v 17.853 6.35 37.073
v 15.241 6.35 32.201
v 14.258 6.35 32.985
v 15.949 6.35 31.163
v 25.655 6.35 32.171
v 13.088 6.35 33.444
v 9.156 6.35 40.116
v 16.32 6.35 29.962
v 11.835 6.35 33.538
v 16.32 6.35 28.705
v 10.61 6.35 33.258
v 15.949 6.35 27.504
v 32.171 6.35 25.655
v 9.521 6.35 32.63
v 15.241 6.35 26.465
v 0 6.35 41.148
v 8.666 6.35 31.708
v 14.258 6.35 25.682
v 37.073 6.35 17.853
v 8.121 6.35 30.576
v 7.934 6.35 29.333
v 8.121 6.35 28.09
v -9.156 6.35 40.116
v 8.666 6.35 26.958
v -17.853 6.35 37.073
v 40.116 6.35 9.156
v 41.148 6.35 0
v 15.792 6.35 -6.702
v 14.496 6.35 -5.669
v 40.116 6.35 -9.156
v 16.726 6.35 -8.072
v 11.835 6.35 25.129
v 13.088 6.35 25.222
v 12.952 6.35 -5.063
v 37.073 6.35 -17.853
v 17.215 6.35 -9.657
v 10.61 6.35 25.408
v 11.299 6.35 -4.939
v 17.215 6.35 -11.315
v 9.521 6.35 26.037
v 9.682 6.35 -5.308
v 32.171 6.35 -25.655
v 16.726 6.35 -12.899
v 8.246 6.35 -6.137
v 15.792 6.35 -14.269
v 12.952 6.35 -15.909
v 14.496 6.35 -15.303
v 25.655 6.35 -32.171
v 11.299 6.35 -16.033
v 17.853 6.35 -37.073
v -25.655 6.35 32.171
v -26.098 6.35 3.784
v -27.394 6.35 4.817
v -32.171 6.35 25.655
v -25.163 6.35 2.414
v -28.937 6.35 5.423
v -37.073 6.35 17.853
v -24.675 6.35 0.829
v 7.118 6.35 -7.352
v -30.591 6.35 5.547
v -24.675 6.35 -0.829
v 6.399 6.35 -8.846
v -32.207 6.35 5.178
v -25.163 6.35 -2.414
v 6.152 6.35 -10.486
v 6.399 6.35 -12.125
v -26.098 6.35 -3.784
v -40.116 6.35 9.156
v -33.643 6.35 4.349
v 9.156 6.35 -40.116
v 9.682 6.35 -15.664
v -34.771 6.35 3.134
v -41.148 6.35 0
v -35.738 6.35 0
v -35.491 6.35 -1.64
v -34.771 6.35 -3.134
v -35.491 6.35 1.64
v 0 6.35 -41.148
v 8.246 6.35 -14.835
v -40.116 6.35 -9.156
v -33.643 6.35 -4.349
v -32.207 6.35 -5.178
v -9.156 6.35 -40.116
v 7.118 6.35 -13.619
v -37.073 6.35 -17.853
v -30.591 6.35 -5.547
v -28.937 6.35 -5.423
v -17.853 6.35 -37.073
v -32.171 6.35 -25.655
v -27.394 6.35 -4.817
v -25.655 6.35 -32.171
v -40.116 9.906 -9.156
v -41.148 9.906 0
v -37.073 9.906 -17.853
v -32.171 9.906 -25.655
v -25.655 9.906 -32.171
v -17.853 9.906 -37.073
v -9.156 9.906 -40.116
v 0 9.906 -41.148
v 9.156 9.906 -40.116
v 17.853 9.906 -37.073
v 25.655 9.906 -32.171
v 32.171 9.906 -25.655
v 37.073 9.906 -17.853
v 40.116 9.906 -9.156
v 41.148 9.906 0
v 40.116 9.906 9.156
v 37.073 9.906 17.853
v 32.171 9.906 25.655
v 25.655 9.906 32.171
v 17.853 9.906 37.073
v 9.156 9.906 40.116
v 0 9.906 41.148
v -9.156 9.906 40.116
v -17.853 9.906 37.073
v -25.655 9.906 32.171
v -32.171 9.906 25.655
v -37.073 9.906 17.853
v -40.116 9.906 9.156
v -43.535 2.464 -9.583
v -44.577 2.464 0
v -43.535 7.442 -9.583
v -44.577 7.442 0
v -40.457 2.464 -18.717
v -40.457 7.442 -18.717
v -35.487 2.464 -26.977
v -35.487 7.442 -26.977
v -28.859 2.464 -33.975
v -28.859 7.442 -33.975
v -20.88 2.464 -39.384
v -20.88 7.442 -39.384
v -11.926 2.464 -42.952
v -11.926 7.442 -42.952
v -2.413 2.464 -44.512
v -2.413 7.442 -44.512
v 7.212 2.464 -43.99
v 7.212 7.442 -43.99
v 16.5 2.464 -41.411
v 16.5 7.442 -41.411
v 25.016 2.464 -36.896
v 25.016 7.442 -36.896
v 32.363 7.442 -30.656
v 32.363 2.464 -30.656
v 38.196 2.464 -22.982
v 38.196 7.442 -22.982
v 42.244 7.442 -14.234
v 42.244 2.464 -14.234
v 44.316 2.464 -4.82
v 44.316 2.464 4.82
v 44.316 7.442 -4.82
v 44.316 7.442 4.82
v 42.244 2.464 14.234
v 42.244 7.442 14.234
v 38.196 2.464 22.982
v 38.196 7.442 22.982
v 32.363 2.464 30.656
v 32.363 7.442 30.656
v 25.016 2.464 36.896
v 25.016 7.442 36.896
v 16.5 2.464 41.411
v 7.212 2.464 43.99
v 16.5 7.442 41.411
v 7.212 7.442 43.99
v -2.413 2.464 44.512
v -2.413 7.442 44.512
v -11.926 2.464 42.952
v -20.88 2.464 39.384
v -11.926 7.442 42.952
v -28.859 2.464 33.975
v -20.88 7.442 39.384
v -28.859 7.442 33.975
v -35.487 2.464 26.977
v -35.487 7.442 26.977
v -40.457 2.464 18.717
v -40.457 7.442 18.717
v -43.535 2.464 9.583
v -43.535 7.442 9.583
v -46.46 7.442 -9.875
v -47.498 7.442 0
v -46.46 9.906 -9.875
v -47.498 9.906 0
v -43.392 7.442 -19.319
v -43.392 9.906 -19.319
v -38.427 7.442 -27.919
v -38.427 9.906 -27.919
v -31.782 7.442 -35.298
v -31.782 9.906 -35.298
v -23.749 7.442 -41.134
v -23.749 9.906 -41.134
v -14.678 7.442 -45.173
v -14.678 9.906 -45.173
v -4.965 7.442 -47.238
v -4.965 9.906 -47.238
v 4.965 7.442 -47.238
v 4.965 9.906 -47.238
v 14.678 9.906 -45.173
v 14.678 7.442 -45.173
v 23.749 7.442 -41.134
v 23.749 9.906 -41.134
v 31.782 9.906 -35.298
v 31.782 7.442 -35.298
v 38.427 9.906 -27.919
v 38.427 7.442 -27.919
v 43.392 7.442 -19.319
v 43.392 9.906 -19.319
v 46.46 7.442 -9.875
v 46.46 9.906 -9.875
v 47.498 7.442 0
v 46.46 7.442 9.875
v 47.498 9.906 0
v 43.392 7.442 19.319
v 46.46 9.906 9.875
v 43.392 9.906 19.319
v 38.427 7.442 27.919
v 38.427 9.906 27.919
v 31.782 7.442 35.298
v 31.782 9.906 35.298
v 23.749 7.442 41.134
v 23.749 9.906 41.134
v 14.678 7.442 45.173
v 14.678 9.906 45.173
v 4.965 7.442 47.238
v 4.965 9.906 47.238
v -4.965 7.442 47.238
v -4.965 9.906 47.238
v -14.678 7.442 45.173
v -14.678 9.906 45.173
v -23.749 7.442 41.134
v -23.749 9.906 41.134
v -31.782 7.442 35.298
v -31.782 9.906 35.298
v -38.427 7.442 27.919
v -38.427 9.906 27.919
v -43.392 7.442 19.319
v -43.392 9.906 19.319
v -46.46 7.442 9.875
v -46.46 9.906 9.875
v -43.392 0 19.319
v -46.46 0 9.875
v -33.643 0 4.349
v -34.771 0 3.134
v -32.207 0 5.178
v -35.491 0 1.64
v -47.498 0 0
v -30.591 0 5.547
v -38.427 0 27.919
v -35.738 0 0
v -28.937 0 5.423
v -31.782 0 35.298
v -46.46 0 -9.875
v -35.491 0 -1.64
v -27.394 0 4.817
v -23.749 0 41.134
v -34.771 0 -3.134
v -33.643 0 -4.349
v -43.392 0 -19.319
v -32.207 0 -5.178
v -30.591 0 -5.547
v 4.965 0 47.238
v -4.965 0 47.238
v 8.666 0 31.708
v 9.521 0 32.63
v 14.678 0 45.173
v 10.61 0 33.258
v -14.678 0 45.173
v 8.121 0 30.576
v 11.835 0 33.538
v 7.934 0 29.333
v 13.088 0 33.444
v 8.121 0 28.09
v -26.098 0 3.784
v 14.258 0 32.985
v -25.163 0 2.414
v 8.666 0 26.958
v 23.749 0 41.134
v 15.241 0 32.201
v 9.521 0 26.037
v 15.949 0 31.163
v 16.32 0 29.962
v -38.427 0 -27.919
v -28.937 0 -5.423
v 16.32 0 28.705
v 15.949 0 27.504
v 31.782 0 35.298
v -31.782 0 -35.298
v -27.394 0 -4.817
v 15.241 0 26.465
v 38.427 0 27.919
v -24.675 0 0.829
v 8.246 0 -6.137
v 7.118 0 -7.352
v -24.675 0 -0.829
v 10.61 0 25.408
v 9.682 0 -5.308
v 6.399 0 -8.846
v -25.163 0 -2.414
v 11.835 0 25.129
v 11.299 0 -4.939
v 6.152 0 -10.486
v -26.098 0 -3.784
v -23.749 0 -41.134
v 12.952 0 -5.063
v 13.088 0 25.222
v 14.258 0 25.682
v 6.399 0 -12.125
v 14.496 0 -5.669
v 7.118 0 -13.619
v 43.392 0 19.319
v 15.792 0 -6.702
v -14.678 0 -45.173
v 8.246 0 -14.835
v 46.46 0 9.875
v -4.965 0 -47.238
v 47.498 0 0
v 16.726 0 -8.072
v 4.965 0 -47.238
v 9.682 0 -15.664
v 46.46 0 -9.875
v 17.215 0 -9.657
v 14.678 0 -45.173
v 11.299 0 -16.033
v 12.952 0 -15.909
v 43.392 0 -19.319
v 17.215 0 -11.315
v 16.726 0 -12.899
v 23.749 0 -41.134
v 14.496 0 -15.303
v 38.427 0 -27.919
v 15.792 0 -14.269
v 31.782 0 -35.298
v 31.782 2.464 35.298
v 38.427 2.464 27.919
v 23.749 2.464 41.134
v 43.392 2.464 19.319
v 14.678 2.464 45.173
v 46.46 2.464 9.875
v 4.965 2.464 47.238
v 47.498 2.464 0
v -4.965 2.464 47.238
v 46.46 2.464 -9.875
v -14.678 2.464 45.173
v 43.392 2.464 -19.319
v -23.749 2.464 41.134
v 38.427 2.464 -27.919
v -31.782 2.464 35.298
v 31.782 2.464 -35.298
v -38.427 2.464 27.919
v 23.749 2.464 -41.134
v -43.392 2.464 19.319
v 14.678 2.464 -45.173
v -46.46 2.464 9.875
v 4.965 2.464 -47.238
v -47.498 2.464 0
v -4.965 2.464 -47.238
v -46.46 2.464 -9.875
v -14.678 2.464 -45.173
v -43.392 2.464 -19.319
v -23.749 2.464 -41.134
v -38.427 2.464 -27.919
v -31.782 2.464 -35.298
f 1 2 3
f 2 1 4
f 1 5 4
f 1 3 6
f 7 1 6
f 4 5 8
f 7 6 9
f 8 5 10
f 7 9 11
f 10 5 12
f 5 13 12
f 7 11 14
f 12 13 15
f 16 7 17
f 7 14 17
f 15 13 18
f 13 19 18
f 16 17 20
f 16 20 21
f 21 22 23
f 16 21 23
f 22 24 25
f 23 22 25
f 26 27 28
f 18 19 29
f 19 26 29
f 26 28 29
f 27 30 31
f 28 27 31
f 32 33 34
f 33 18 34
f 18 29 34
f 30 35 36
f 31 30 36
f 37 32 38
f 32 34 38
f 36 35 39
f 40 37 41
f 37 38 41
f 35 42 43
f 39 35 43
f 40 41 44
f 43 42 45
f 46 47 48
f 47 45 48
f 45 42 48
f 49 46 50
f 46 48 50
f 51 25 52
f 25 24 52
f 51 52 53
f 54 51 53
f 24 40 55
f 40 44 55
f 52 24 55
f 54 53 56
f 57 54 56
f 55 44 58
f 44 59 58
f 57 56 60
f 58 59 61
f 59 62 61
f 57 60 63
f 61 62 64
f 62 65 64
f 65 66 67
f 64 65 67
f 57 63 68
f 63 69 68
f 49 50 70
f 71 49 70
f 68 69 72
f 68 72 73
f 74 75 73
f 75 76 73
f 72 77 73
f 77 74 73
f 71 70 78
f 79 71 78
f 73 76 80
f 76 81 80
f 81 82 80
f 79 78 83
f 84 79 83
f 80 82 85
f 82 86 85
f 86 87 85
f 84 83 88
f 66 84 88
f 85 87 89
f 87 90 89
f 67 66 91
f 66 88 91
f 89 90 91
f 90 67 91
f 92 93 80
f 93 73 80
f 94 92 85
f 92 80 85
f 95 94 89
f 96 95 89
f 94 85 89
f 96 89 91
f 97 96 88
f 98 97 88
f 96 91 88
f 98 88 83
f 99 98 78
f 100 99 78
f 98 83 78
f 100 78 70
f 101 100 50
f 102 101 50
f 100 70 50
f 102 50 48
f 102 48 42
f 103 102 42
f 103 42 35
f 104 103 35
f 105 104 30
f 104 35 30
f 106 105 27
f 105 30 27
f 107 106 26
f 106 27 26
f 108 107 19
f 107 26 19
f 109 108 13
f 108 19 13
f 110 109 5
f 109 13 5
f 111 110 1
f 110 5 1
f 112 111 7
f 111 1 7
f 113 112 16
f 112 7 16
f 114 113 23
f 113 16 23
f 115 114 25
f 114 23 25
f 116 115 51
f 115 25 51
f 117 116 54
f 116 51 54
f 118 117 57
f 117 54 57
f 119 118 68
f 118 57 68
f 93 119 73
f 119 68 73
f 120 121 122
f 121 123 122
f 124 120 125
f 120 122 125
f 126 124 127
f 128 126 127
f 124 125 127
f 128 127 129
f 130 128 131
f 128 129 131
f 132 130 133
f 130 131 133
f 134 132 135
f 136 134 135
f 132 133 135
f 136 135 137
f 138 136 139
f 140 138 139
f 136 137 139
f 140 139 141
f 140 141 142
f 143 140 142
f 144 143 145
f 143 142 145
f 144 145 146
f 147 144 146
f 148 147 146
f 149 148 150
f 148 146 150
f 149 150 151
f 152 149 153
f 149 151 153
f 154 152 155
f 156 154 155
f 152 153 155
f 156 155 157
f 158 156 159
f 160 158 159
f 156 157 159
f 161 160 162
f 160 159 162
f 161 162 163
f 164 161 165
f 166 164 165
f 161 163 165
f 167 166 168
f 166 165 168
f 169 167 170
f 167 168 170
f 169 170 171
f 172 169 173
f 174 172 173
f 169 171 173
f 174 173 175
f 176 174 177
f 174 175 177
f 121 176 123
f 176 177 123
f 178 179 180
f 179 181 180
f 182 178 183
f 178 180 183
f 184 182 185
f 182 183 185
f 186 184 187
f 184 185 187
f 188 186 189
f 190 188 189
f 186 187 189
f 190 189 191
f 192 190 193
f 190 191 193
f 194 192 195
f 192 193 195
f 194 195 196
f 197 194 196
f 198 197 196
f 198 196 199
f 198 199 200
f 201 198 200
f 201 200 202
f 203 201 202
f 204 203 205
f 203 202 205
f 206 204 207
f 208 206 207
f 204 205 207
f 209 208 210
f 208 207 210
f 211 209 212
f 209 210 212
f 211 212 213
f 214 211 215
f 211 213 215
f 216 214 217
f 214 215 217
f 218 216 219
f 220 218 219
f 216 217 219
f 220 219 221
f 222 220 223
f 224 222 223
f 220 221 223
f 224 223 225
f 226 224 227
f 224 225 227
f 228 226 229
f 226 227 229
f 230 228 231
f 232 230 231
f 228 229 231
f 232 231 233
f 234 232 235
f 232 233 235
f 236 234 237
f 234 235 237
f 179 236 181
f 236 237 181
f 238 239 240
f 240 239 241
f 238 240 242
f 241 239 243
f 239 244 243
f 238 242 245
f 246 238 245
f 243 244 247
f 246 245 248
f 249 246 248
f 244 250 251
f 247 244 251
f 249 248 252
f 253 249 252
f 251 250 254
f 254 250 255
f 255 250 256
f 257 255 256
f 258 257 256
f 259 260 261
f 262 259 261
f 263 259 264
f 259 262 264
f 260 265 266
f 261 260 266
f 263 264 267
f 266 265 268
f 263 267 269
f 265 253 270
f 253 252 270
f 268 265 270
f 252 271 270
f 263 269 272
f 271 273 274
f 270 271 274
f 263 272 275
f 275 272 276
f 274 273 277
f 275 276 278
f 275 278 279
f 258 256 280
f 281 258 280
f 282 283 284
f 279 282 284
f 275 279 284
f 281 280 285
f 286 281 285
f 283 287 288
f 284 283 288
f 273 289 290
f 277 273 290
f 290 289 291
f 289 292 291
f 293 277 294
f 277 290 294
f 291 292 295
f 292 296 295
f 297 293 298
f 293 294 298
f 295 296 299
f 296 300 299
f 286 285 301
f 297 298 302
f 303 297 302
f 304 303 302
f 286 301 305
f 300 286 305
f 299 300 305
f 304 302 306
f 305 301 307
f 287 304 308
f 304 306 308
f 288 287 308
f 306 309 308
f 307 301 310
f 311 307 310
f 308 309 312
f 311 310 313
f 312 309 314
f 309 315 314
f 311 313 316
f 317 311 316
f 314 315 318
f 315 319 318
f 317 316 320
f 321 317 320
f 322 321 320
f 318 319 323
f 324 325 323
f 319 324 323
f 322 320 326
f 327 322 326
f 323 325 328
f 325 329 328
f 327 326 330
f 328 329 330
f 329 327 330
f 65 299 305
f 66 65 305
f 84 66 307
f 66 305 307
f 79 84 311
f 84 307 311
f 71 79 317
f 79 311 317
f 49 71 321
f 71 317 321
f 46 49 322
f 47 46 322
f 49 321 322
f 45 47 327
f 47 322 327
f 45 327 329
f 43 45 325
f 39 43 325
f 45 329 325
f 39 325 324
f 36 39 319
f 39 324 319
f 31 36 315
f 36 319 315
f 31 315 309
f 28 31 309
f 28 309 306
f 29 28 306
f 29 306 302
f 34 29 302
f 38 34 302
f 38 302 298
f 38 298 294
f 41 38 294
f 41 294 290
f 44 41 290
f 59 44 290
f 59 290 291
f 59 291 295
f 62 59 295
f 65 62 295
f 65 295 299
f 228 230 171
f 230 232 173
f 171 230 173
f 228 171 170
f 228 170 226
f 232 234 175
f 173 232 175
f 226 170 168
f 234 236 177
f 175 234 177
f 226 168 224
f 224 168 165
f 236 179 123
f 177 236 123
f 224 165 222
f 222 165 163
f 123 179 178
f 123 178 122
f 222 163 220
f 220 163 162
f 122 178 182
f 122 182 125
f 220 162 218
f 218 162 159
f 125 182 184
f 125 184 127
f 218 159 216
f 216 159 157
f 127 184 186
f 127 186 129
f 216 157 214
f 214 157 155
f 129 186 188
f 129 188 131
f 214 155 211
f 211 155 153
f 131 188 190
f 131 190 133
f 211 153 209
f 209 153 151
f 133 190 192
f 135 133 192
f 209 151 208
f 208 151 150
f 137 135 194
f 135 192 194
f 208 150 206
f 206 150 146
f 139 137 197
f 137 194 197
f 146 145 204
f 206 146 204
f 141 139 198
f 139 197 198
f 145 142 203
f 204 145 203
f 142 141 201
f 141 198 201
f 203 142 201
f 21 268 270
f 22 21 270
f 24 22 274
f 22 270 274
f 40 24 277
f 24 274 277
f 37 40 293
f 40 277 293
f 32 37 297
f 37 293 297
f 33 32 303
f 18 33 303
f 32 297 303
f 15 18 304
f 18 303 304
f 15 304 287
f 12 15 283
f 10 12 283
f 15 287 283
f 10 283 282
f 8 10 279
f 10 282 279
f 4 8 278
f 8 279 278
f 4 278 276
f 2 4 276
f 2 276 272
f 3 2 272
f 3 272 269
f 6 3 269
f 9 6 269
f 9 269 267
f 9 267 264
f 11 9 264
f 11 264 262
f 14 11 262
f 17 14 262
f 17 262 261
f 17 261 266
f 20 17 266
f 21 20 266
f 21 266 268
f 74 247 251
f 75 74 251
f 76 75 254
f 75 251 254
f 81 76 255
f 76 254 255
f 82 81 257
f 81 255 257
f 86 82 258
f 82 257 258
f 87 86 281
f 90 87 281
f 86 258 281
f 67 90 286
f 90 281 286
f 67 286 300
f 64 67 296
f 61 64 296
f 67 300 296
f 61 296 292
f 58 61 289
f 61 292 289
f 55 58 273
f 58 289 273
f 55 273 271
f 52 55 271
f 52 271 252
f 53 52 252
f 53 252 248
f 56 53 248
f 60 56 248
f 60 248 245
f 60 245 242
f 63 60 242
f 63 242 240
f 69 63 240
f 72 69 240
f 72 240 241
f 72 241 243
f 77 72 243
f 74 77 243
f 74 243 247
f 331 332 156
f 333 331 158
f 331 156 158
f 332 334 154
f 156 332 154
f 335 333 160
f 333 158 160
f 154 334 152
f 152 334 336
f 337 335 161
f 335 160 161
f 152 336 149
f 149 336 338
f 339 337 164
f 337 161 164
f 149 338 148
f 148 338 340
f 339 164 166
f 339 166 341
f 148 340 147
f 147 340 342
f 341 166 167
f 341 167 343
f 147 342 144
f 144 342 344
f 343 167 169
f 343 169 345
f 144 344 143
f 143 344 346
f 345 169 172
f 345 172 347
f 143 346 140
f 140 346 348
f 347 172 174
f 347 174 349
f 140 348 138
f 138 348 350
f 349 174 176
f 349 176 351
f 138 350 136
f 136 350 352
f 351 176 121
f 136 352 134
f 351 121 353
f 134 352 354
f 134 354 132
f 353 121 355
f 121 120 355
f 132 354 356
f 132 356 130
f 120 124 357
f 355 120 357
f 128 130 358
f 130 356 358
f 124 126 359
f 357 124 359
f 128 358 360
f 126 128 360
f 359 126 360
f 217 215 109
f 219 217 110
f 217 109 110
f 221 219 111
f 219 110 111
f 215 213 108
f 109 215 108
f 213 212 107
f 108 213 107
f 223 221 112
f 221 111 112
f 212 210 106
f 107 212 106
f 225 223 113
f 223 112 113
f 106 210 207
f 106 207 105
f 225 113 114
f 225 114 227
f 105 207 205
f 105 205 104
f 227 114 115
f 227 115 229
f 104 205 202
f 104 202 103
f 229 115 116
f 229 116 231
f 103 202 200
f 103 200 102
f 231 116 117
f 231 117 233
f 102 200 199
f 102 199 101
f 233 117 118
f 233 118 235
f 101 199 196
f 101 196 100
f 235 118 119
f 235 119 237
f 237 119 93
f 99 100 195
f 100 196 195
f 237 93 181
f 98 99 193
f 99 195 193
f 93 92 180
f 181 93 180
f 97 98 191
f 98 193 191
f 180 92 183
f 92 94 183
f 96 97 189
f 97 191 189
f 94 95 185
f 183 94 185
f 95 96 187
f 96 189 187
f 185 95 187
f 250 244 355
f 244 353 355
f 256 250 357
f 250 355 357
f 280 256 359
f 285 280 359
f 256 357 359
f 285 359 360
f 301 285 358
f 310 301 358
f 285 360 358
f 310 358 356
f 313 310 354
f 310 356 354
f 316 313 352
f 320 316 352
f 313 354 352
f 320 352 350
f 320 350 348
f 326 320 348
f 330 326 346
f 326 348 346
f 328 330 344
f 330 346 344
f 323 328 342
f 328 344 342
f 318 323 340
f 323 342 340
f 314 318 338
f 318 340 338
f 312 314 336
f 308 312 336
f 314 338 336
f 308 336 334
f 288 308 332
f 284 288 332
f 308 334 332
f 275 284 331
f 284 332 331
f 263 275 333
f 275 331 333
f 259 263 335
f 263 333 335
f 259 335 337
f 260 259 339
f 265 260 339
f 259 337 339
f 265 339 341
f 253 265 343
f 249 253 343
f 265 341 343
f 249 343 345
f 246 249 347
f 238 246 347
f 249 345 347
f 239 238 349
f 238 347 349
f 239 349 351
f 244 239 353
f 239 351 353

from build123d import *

# Parameters (mm, degrees)
PIPE_TAP_DRILL_FOR_1_4_TAP1_D = 11.1252
PIPE_TAP_DRILL_FOR_1_8_TAP1_D = 8.4328
SKETCH6_R                     = 6.35
BOSS_EXTRUDE1_DEPTH           = 6.35
PIPE_TAP_DRILL_FOR_1_4_TAP2_D = 11.1252


with BuildPart() as part:
    # Sketch1 → Revolve1 (revolve)
    with BuildSketch(Plane.XY, mode=Mode.PRIVATE) as revolve1_sk:
        Polygon((0, 0), (47.498, 0), (47.498, 2.4638), (44.577, 2.4638), (44.577, 7.4422), (47.498, 7.4422), (47.498, 9.906), (41.148, 9.906), (41.148, 6.35), (0, 6.35), align=None)
    revolve(revolve1_sk.sketch.rotate(Axis((0, 48.192213231, 0), (0, -1, 0)), 180), axis=Axis((0, 48.192213231, 0), (0, -1, 0)))

    # Pipe Tap Drill for 1/4 Tap1 (through all)
    with Locations(Plane(origin=(0, 6.35, 0), x_dir=(1, 0, 0), z_dir=(0, 1, 0))):
        with Locations((0, 0), (-30.1752, 0)):
            Hole(PIPE_TAP_DRILL_FOR_1_4_TAP1_D / 2)

    # Pipe Tap Drill for 1/8 Tap1 (through all)
    with Locations(Plane(origin=(0, 6.35, 0), x_dir=(1, 0, 0), z_dir=(0, 1, 0))):
        with Locations((12.150198978, -29.333175157)):
            Hole(PIPE_TAP_DRILL_FOR_1_8_TAP1_D / 2)

    # Sketch6 → Boss-Extrude1 (add)
    with BuildSketch(Plane(origin=(0, 6.35, 0), x_dir=(1, 0, 0), z_dir=(0, 1, 0))):
        Circle(SKETCH6_R)
    extrude(amount=-BOSS_EXTRUDE1_DEPTH)

    # Pipe Tap Drill for 1/4 Tap2 (through all)
    with Locations(Plane(origin=(0, 6.35, 0), x_dir=(1, 0, 0), z_dir=(0, 1, 0))):
        with Locations((11.714341144, 10.485870911)):
            Hole(PIPE_TAP_DRILL_FOR_1_4_TAP2_D / 2)


solid = part.part
